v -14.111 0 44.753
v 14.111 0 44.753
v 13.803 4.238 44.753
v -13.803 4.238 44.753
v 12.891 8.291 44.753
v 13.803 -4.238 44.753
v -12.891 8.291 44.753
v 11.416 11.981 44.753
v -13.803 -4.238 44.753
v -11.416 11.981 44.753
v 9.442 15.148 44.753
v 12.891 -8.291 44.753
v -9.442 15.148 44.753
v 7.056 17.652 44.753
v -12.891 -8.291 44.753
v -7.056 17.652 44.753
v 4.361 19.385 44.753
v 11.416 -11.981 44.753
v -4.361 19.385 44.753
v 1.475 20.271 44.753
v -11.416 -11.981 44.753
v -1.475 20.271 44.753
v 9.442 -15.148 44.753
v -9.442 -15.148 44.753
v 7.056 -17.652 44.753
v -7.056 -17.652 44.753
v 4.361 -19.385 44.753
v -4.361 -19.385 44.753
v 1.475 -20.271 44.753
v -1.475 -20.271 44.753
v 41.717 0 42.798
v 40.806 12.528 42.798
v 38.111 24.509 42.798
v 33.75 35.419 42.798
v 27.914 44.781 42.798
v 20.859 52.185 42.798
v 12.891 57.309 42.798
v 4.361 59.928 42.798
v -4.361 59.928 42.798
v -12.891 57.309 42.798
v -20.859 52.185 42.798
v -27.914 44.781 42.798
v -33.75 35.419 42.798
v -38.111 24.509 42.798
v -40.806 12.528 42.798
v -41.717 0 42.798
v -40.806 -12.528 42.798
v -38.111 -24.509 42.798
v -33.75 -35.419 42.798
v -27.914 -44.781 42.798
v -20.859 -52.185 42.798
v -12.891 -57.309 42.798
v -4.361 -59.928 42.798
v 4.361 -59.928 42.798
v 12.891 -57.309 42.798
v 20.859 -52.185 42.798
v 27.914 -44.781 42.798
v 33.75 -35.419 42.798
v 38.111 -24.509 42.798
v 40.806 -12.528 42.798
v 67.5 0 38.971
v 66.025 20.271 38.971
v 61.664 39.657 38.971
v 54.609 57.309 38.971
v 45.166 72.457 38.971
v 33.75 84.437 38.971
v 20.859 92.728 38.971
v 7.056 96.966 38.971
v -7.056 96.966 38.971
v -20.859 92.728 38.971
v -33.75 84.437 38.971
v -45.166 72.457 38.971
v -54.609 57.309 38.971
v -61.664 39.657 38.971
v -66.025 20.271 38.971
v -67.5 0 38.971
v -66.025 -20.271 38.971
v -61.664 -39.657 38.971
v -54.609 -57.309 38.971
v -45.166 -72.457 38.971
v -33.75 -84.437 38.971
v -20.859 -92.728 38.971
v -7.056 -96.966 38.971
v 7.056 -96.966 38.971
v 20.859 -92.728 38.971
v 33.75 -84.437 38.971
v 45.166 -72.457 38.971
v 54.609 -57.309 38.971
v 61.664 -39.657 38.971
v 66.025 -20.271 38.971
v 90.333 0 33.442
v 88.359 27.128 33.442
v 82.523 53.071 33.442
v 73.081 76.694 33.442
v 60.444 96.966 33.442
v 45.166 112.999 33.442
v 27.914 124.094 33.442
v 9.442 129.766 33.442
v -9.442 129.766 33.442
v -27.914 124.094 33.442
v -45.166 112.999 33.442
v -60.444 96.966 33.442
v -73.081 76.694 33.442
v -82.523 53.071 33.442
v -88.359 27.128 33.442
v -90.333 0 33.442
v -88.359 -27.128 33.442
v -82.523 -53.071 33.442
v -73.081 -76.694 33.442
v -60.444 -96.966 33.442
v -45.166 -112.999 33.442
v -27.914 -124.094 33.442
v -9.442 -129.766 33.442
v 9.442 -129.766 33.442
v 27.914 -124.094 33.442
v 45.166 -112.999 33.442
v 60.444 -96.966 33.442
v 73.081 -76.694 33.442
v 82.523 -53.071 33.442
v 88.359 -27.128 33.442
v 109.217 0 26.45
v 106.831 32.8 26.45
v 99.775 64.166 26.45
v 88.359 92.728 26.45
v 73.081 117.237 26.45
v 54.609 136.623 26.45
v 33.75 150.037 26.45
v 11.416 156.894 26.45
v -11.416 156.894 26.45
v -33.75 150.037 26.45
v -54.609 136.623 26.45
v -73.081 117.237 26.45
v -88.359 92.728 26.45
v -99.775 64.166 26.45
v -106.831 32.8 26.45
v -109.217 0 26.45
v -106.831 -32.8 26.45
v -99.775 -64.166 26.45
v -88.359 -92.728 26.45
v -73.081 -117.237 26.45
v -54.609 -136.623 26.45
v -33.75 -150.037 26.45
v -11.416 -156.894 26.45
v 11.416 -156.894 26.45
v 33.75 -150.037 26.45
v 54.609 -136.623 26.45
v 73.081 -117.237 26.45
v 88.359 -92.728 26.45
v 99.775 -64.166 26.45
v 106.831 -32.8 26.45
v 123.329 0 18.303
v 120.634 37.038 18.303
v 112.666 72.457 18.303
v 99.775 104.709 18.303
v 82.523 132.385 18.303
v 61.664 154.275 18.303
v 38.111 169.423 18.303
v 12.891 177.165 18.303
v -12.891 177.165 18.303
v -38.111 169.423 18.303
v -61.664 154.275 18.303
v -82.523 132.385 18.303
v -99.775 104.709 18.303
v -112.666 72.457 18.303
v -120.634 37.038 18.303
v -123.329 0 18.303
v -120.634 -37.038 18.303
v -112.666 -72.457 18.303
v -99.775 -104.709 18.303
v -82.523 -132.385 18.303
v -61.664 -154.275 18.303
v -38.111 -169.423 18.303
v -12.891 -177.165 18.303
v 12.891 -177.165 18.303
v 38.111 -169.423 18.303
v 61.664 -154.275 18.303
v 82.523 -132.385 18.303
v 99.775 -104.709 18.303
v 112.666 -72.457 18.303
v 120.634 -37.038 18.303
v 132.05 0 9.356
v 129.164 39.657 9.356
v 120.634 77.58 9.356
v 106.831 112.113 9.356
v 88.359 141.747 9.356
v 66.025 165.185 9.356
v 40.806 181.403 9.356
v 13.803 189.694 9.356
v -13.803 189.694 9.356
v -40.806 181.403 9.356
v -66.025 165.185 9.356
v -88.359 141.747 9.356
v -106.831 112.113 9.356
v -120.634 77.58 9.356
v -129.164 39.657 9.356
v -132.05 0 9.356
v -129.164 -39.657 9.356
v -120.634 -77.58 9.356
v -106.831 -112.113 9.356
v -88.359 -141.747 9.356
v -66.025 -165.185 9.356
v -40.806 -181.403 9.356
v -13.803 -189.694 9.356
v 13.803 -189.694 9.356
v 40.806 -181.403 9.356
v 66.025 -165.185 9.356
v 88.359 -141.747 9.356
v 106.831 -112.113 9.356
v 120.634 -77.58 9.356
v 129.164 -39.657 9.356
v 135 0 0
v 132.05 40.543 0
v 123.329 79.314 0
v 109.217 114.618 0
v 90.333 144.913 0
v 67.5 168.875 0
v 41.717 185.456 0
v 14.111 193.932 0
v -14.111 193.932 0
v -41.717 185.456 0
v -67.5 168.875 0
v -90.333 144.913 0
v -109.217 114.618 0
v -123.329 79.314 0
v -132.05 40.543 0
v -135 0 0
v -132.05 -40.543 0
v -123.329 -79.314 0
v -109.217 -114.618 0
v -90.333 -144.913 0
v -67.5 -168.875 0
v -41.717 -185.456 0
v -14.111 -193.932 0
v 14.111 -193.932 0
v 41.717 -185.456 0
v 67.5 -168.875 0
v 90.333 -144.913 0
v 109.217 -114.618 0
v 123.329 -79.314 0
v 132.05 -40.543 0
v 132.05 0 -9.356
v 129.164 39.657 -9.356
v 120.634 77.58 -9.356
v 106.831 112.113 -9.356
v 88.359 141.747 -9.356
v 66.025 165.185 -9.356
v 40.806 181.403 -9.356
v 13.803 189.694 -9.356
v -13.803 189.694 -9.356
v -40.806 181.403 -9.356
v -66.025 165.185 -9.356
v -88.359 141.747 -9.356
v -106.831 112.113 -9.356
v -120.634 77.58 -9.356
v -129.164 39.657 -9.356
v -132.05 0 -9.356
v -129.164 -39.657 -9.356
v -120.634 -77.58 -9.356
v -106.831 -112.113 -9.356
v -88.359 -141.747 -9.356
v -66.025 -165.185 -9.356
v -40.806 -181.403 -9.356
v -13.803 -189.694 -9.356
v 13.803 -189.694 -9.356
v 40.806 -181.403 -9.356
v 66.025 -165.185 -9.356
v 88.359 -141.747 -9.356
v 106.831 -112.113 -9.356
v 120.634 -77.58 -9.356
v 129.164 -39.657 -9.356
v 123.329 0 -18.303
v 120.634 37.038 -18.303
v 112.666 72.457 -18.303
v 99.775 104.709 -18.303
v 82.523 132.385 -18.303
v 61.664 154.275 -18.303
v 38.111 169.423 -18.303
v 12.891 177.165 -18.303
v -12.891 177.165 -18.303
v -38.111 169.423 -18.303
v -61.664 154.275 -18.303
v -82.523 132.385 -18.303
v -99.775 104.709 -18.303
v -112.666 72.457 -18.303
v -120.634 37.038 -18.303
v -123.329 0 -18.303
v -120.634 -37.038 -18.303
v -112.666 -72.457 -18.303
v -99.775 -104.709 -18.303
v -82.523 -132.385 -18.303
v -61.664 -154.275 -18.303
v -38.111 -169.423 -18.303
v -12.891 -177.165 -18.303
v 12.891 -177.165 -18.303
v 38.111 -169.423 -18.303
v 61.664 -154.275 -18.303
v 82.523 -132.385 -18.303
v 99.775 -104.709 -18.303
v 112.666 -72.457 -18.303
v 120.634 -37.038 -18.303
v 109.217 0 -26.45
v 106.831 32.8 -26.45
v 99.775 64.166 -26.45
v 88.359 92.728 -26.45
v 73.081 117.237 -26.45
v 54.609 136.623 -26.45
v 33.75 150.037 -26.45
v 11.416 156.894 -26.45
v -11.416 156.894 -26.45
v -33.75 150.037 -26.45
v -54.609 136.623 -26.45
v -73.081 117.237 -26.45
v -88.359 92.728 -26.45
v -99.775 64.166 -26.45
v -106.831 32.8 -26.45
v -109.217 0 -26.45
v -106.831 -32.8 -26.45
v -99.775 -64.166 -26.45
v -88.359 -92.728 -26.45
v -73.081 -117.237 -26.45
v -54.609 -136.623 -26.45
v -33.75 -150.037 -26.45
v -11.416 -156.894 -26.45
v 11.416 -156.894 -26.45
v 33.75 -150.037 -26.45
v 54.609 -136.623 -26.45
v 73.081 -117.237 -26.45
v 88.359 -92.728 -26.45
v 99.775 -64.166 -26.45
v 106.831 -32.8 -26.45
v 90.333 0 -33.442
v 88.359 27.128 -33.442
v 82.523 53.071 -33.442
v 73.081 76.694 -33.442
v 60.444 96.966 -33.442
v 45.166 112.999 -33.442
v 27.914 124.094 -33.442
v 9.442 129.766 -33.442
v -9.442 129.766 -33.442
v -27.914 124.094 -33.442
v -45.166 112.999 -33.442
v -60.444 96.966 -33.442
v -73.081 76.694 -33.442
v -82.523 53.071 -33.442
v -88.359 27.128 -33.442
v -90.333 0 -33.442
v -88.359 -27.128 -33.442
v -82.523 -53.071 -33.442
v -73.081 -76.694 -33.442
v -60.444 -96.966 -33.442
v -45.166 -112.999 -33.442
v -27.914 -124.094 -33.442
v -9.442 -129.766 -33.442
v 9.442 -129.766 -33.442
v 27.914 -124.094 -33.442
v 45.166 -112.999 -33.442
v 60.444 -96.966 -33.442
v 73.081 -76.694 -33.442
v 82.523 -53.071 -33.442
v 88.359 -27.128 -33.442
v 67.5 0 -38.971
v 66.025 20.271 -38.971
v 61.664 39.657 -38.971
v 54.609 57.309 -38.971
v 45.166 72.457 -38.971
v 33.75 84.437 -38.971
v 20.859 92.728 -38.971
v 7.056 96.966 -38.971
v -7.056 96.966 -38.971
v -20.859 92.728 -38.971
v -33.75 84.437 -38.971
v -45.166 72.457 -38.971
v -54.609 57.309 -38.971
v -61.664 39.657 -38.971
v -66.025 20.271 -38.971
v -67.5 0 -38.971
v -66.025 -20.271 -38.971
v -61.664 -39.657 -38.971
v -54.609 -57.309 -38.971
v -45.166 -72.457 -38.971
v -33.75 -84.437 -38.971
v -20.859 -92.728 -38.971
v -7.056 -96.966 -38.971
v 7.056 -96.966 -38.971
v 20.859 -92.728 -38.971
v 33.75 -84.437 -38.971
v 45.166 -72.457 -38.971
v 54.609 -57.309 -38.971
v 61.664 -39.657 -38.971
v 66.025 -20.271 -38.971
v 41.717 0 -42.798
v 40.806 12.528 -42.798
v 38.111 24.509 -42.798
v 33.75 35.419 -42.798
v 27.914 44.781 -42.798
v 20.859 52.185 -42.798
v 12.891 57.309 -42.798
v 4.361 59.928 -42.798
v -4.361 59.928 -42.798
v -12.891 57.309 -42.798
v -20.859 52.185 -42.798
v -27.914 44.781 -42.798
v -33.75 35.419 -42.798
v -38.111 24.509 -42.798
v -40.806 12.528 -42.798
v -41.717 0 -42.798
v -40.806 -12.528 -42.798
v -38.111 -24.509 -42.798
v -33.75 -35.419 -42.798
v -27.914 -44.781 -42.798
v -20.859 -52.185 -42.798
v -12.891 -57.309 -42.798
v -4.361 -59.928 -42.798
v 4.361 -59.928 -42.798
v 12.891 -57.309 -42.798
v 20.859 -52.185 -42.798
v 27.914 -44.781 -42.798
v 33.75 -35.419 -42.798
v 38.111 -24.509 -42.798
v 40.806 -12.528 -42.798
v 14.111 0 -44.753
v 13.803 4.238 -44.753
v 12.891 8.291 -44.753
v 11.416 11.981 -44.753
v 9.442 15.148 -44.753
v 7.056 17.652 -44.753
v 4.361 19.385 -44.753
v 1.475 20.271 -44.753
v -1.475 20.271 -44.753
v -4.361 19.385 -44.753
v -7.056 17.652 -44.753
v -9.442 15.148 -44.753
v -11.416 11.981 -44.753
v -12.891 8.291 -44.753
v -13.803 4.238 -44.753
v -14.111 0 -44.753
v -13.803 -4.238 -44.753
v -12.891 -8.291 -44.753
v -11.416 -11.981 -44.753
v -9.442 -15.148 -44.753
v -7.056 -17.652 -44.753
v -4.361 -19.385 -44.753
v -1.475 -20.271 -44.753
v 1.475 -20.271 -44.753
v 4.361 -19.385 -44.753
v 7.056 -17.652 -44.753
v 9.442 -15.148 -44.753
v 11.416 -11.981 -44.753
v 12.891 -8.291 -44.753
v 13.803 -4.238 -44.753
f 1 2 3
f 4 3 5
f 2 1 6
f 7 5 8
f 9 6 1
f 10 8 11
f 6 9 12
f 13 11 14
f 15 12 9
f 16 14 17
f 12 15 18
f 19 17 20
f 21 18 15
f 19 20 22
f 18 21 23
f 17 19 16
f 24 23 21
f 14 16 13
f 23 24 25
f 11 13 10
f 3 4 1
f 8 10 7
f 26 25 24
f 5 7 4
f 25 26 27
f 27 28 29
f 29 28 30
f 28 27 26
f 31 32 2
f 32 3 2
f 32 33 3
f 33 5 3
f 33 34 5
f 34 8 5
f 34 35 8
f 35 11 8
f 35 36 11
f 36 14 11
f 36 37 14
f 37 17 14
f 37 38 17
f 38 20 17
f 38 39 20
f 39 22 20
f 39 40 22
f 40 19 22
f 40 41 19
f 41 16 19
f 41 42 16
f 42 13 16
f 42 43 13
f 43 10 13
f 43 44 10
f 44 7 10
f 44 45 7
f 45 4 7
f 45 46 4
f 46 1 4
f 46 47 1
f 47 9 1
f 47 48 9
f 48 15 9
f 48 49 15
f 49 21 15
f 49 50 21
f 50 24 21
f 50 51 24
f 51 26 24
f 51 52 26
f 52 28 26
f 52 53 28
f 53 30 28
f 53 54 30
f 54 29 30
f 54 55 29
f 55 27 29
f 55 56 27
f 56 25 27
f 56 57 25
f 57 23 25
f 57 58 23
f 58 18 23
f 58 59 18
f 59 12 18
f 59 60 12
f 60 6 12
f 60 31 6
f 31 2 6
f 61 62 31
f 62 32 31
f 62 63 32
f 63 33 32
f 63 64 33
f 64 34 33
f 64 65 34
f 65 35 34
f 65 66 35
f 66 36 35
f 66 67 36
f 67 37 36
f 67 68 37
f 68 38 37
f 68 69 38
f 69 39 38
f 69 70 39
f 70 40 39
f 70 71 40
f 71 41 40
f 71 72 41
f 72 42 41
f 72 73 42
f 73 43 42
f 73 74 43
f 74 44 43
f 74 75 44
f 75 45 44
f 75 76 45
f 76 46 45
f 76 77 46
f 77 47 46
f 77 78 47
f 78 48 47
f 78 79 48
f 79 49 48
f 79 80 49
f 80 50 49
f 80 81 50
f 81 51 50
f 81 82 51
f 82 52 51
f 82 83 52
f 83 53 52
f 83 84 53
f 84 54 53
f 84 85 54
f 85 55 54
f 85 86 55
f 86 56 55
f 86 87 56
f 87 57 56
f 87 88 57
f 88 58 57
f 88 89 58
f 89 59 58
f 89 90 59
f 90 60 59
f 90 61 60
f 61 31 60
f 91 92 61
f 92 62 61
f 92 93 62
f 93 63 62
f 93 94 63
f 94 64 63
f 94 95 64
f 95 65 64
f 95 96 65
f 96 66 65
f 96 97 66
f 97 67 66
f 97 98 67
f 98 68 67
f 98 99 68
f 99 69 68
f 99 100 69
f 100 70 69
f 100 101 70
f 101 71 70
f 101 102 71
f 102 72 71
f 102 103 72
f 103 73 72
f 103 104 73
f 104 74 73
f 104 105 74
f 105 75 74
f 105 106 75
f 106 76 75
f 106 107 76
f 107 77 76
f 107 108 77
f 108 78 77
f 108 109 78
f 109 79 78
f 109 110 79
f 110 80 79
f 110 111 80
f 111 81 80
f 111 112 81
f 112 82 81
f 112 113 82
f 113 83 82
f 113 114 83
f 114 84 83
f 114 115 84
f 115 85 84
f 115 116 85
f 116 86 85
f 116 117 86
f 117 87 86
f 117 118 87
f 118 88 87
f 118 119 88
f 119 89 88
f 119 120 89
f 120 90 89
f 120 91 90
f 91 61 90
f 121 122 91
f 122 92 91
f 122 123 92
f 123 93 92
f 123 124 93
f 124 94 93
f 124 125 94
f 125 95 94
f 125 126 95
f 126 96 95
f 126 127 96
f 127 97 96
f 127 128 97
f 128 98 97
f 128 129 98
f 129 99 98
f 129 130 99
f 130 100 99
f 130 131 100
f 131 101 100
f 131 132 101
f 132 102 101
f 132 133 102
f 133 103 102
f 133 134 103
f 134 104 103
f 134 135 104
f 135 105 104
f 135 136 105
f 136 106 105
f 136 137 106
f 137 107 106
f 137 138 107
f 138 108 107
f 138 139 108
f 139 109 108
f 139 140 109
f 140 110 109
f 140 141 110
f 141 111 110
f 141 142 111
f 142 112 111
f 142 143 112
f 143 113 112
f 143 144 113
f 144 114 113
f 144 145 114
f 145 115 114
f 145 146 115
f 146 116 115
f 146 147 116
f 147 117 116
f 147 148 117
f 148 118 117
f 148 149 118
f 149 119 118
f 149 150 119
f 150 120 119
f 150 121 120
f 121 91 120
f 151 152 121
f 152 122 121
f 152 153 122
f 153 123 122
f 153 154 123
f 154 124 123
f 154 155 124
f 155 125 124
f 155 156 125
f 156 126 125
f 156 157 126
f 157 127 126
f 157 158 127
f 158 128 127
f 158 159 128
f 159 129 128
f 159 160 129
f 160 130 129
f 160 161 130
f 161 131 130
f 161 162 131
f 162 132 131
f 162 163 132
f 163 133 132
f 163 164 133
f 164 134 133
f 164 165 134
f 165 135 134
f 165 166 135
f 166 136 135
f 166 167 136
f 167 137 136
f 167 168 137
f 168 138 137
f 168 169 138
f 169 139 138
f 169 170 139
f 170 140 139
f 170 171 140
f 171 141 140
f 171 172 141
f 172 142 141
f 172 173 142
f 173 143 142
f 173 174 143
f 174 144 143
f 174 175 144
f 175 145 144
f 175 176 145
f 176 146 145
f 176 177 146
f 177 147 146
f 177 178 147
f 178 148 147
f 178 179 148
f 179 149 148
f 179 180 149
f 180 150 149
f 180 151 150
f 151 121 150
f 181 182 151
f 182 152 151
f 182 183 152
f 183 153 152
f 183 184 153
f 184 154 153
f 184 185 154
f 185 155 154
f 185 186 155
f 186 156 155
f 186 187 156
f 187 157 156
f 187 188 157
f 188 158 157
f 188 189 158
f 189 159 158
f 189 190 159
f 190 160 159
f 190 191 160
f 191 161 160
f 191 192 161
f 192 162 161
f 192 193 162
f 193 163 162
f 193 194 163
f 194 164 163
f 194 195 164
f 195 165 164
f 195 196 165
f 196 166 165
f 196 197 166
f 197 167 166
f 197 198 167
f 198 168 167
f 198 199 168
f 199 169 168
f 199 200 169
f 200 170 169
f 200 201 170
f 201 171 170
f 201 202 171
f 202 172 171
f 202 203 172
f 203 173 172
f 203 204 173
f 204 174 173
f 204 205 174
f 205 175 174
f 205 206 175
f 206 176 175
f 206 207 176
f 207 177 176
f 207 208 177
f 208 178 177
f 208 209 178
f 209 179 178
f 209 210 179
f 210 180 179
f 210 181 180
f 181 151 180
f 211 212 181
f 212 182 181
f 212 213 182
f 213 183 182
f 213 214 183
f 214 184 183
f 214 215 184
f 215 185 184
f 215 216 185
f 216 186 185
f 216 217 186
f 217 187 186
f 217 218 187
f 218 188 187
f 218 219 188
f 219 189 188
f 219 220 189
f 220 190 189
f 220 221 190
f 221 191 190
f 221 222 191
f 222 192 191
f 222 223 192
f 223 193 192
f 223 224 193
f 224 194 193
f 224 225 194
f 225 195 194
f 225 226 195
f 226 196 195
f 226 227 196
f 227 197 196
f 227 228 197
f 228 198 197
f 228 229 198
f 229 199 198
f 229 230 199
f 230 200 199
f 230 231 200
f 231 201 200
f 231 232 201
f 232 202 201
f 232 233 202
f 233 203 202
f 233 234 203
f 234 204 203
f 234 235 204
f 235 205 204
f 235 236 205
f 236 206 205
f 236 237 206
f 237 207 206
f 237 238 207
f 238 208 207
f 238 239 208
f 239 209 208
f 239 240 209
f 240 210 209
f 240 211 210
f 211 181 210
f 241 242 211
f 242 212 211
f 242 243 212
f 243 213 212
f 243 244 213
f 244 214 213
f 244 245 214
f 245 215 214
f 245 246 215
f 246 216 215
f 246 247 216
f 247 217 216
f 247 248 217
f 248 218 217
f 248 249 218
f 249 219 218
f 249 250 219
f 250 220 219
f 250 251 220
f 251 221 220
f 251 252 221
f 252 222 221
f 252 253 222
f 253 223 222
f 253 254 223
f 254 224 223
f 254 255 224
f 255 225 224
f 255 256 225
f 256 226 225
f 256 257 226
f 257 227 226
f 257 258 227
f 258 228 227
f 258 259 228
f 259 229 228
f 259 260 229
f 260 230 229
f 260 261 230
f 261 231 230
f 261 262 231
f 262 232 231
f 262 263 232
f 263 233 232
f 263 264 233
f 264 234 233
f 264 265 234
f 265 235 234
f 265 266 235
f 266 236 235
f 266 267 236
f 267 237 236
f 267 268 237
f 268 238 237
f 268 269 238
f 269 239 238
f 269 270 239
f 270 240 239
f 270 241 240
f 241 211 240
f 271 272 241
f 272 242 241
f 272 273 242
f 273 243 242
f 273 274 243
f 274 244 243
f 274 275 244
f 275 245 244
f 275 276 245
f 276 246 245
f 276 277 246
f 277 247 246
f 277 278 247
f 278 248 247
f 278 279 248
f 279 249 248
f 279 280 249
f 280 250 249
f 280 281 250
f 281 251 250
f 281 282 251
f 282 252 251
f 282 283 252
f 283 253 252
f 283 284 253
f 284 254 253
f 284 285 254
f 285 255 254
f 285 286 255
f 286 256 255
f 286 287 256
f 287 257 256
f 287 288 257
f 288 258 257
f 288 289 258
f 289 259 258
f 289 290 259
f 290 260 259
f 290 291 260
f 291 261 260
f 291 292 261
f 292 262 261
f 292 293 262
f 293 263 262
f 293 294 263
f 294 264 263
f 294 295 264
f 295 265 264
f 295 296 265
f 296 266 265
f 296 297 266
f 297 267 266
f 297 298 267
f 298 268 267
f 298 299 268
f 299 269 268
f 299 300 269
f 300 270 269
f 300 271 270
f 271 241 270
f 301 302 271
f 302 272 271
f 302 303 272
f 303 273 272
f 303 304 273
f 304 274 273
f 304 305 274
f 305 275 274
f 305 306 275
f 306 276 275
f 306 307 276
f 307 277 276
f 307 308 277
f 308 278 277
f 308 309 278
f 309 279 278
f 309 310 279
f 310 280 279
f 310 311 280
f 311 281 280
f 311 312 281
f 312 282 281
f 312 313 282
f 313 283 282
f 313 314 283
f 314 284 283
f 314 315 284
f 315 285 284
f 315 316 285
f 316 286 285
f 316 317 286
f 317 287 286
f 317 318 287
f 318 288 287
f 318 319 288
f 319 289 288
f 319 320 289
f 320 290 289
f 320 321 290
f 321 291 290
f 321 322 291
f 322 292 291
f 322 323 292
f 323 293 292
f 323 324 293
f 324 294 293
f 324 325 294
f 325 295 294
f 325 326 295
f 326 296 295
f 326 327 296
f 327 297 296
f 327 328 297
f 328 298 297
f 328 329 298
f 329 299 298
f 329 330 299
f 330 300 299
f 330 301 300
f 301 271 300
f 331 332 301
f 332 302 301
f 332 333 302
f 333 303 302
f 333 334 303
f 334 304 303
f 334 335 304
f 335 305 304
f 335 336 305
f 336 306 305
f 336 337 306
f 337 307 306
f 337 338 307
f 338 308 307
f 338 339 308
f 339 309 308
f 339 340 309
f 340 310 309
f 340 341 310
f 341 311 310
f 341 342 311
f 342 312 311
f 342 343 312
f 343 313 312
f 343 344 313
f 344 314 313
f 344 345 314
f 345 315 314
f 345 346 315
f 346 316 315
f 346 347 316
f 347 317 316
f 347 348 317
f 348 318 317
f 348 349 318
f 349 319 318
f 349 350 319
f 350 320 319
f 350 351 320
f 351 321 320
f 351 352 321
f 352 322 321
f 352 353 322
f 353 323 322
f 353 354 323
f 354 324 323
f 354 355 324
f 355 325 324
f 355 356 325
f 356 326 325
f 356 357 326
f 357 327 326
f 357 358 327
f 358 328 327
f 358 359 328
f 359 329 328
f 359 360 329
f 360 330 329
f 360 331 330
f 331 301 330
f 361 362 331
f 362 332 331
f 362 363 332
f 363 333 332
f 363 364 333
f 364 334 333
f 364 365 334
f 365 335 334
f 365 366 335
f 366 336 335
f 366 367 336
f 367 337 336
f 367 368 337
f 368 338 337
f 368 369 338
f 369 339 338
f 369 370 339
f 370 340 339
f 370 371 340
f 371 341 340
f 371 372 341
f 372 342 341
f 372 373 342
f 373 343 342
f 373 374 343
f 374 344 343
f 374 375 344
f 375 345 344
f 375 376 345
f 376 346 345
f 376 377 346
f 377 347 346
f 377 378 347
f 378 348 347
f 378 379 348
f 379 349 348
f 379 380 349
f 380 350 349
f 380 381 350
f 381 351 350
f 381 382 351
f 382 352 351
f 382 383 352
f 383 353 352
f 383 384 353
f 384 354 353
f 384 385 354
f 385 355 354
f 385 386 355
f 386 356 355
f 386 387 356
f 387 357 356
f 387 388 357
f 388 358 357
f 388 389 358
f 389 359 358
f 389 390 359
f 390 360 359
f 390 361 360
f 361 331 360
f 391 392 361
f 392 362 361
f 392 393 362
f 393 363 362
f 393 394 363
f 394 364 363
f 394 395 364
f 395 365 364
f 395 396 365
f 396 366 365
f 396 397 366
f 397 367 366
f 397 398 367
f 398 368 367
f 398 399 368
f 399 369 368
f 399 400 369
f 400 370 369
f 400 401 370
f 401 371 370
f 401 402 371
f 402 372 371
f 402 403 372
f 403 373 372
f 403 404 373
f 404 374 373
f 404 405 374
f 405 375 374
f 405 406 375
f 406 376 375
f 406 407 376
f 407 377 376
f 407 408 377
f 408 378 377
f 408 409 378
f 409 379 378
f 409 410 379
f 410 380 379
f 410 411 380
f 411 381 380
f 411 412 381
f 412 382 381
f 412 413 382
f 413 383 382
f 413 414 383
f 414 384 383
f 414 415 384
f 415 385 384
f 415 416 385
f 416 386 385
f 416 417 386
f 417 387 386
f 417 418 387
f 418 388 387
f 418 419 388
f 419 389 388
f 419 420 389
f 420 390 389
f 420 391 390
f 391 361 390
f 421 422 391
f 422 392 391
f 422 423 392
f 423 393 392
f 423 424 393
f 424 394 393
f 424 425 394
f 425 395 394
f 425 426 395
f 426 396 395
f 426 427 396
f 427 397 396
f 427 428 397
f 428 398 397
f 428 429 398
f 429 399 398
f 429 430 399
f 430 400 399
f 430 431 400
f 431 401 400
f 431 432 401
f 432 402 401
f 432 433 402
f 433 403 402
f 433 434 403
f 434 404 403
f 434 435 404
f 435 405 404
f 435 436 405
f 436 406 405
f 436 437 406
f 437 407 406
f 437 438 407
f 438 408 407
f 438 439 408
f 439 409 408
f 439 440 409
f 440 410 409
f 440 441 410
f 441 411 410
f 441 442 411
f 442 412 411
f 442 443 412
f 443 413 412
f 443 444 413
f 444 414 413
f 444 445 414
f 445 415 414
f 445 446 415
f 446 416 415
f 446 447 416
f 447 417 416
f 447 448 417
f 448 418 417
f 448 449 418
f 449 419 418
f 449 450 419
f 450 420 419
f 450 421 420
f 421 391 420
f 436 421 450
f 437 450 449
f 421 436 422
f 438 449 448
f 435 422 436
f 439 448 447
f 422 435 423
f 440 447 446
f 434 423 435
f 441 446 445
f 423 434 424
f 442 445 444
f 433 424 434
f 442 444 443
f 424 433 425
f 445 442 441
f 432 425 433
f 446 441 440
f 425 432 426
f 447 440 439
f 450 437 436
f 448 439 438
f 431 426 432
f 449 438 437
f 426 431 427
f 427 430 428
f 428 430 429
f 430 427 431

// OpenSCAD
// Generated by SolidPython 1.0.1 on 2020-07-29 00:46:48


scale(v = [9, 13, 3]) {
	sphere(r = 15);
}
/***********************************************
*********      SolidPython code:      **********
************************************************
 
# import packages: SolidPython
from solid import *
from solid.utils import *
from itertools import chain, combinations, permutations


class Resize:

    def __init__(self, scad_file):
        self.scad_file = scad_file
        #self.scad_file = import_scad(scad_file)
        # cone/cylinder param:
        self.r1 = 0
        self.r2 = 0
        self.h = 0
        # rectangular prism param:
        self.w = 0
        self.l = 0
        # ellipse param:
        self.r = 0

    # import OpenScad code (file name corresponds to shape)


    # classify shape + parameters
    def assign(self, param1, param2, param3):
        if self.scad_file == 'cone.scad':
            self.r1 = param1
            self.r2 = param2
            self.h = param3
        elif self.scad_file == 'cylinder.scad':
            self.r1 = param1
            self.r2 = param2
            self.h = param3
        elif self.scad_file == 'rectangularPrism.scad':
            self.h = param1
            self.l = param2
            self.w = param3
        else:
            self.r = param1
            self.h = param2

    # resize parameters
    def iterate(self):
        x = range(3, 20, 2)
        i = 1
        if self.scad_file == 'cone.scad':
            tempList = list(permutations(x, 2))
            for temp in tempList:
                param1 = temp[0]
                param2 = temp[1]
                filepath = 'produced_scad_files/' + 'cone' + str(param1) + '_' + str(param2) + '_' + '.scad'
                scad_render_to_file(cylinder(h=param1, r1=param2, r2=0), filepath)

        elif self.scad_file == 'cylinder.scad':
            tempList = list(permutations(x, 3))
            for temp in tempList:
                param1 = temp[0]
                param2 = temp[1]
                filepath = 'produced_scad_files/' + 'cylinder' + str(param1) + '_' + str(param2) + '_' + '.scad'
                scad_render_to_file(cylinder(h=param1, r1=param2, r2=param2), filepath)

        elif self.scad_file == 'rectangularPrism.scad':
            tempList = list(permutations(x, 3))
            for temp in tempList:
                param1 = temp[0]
                param2 = temp[1]
                param3 = temp[2]
                filepath = 'produced_scad_files/' + 'rectangularPrism' + str(param1) + '_' + str(param2) + '_' + str(
                    param3) + '.scad'
                scad_render_to_file(cube(size=(param1, param2, param3)), filepath)

        elif self.scad_file == 'ellipse.scad':
            tempList = list(permutations(x, 4))
            for temp in tempList:
                param1 = temp[0]
                param2 = temp[1]
                param3 = temp[2]
                param4 = temp[3]
                filepath = 'produced_scad_files/' + 'ellipse' + str(param1) + '_' + str(param2) + '_' + str(param3) + '_' + str(param4) + '.scad'
                scad_render_to_file(scale([param1, param2, param3])(sphere(r=param4)), filepath)

    def render_to_scadfile(self):
        scad_render_to_file(scad, 'example.scad') 
 
************************************************/
